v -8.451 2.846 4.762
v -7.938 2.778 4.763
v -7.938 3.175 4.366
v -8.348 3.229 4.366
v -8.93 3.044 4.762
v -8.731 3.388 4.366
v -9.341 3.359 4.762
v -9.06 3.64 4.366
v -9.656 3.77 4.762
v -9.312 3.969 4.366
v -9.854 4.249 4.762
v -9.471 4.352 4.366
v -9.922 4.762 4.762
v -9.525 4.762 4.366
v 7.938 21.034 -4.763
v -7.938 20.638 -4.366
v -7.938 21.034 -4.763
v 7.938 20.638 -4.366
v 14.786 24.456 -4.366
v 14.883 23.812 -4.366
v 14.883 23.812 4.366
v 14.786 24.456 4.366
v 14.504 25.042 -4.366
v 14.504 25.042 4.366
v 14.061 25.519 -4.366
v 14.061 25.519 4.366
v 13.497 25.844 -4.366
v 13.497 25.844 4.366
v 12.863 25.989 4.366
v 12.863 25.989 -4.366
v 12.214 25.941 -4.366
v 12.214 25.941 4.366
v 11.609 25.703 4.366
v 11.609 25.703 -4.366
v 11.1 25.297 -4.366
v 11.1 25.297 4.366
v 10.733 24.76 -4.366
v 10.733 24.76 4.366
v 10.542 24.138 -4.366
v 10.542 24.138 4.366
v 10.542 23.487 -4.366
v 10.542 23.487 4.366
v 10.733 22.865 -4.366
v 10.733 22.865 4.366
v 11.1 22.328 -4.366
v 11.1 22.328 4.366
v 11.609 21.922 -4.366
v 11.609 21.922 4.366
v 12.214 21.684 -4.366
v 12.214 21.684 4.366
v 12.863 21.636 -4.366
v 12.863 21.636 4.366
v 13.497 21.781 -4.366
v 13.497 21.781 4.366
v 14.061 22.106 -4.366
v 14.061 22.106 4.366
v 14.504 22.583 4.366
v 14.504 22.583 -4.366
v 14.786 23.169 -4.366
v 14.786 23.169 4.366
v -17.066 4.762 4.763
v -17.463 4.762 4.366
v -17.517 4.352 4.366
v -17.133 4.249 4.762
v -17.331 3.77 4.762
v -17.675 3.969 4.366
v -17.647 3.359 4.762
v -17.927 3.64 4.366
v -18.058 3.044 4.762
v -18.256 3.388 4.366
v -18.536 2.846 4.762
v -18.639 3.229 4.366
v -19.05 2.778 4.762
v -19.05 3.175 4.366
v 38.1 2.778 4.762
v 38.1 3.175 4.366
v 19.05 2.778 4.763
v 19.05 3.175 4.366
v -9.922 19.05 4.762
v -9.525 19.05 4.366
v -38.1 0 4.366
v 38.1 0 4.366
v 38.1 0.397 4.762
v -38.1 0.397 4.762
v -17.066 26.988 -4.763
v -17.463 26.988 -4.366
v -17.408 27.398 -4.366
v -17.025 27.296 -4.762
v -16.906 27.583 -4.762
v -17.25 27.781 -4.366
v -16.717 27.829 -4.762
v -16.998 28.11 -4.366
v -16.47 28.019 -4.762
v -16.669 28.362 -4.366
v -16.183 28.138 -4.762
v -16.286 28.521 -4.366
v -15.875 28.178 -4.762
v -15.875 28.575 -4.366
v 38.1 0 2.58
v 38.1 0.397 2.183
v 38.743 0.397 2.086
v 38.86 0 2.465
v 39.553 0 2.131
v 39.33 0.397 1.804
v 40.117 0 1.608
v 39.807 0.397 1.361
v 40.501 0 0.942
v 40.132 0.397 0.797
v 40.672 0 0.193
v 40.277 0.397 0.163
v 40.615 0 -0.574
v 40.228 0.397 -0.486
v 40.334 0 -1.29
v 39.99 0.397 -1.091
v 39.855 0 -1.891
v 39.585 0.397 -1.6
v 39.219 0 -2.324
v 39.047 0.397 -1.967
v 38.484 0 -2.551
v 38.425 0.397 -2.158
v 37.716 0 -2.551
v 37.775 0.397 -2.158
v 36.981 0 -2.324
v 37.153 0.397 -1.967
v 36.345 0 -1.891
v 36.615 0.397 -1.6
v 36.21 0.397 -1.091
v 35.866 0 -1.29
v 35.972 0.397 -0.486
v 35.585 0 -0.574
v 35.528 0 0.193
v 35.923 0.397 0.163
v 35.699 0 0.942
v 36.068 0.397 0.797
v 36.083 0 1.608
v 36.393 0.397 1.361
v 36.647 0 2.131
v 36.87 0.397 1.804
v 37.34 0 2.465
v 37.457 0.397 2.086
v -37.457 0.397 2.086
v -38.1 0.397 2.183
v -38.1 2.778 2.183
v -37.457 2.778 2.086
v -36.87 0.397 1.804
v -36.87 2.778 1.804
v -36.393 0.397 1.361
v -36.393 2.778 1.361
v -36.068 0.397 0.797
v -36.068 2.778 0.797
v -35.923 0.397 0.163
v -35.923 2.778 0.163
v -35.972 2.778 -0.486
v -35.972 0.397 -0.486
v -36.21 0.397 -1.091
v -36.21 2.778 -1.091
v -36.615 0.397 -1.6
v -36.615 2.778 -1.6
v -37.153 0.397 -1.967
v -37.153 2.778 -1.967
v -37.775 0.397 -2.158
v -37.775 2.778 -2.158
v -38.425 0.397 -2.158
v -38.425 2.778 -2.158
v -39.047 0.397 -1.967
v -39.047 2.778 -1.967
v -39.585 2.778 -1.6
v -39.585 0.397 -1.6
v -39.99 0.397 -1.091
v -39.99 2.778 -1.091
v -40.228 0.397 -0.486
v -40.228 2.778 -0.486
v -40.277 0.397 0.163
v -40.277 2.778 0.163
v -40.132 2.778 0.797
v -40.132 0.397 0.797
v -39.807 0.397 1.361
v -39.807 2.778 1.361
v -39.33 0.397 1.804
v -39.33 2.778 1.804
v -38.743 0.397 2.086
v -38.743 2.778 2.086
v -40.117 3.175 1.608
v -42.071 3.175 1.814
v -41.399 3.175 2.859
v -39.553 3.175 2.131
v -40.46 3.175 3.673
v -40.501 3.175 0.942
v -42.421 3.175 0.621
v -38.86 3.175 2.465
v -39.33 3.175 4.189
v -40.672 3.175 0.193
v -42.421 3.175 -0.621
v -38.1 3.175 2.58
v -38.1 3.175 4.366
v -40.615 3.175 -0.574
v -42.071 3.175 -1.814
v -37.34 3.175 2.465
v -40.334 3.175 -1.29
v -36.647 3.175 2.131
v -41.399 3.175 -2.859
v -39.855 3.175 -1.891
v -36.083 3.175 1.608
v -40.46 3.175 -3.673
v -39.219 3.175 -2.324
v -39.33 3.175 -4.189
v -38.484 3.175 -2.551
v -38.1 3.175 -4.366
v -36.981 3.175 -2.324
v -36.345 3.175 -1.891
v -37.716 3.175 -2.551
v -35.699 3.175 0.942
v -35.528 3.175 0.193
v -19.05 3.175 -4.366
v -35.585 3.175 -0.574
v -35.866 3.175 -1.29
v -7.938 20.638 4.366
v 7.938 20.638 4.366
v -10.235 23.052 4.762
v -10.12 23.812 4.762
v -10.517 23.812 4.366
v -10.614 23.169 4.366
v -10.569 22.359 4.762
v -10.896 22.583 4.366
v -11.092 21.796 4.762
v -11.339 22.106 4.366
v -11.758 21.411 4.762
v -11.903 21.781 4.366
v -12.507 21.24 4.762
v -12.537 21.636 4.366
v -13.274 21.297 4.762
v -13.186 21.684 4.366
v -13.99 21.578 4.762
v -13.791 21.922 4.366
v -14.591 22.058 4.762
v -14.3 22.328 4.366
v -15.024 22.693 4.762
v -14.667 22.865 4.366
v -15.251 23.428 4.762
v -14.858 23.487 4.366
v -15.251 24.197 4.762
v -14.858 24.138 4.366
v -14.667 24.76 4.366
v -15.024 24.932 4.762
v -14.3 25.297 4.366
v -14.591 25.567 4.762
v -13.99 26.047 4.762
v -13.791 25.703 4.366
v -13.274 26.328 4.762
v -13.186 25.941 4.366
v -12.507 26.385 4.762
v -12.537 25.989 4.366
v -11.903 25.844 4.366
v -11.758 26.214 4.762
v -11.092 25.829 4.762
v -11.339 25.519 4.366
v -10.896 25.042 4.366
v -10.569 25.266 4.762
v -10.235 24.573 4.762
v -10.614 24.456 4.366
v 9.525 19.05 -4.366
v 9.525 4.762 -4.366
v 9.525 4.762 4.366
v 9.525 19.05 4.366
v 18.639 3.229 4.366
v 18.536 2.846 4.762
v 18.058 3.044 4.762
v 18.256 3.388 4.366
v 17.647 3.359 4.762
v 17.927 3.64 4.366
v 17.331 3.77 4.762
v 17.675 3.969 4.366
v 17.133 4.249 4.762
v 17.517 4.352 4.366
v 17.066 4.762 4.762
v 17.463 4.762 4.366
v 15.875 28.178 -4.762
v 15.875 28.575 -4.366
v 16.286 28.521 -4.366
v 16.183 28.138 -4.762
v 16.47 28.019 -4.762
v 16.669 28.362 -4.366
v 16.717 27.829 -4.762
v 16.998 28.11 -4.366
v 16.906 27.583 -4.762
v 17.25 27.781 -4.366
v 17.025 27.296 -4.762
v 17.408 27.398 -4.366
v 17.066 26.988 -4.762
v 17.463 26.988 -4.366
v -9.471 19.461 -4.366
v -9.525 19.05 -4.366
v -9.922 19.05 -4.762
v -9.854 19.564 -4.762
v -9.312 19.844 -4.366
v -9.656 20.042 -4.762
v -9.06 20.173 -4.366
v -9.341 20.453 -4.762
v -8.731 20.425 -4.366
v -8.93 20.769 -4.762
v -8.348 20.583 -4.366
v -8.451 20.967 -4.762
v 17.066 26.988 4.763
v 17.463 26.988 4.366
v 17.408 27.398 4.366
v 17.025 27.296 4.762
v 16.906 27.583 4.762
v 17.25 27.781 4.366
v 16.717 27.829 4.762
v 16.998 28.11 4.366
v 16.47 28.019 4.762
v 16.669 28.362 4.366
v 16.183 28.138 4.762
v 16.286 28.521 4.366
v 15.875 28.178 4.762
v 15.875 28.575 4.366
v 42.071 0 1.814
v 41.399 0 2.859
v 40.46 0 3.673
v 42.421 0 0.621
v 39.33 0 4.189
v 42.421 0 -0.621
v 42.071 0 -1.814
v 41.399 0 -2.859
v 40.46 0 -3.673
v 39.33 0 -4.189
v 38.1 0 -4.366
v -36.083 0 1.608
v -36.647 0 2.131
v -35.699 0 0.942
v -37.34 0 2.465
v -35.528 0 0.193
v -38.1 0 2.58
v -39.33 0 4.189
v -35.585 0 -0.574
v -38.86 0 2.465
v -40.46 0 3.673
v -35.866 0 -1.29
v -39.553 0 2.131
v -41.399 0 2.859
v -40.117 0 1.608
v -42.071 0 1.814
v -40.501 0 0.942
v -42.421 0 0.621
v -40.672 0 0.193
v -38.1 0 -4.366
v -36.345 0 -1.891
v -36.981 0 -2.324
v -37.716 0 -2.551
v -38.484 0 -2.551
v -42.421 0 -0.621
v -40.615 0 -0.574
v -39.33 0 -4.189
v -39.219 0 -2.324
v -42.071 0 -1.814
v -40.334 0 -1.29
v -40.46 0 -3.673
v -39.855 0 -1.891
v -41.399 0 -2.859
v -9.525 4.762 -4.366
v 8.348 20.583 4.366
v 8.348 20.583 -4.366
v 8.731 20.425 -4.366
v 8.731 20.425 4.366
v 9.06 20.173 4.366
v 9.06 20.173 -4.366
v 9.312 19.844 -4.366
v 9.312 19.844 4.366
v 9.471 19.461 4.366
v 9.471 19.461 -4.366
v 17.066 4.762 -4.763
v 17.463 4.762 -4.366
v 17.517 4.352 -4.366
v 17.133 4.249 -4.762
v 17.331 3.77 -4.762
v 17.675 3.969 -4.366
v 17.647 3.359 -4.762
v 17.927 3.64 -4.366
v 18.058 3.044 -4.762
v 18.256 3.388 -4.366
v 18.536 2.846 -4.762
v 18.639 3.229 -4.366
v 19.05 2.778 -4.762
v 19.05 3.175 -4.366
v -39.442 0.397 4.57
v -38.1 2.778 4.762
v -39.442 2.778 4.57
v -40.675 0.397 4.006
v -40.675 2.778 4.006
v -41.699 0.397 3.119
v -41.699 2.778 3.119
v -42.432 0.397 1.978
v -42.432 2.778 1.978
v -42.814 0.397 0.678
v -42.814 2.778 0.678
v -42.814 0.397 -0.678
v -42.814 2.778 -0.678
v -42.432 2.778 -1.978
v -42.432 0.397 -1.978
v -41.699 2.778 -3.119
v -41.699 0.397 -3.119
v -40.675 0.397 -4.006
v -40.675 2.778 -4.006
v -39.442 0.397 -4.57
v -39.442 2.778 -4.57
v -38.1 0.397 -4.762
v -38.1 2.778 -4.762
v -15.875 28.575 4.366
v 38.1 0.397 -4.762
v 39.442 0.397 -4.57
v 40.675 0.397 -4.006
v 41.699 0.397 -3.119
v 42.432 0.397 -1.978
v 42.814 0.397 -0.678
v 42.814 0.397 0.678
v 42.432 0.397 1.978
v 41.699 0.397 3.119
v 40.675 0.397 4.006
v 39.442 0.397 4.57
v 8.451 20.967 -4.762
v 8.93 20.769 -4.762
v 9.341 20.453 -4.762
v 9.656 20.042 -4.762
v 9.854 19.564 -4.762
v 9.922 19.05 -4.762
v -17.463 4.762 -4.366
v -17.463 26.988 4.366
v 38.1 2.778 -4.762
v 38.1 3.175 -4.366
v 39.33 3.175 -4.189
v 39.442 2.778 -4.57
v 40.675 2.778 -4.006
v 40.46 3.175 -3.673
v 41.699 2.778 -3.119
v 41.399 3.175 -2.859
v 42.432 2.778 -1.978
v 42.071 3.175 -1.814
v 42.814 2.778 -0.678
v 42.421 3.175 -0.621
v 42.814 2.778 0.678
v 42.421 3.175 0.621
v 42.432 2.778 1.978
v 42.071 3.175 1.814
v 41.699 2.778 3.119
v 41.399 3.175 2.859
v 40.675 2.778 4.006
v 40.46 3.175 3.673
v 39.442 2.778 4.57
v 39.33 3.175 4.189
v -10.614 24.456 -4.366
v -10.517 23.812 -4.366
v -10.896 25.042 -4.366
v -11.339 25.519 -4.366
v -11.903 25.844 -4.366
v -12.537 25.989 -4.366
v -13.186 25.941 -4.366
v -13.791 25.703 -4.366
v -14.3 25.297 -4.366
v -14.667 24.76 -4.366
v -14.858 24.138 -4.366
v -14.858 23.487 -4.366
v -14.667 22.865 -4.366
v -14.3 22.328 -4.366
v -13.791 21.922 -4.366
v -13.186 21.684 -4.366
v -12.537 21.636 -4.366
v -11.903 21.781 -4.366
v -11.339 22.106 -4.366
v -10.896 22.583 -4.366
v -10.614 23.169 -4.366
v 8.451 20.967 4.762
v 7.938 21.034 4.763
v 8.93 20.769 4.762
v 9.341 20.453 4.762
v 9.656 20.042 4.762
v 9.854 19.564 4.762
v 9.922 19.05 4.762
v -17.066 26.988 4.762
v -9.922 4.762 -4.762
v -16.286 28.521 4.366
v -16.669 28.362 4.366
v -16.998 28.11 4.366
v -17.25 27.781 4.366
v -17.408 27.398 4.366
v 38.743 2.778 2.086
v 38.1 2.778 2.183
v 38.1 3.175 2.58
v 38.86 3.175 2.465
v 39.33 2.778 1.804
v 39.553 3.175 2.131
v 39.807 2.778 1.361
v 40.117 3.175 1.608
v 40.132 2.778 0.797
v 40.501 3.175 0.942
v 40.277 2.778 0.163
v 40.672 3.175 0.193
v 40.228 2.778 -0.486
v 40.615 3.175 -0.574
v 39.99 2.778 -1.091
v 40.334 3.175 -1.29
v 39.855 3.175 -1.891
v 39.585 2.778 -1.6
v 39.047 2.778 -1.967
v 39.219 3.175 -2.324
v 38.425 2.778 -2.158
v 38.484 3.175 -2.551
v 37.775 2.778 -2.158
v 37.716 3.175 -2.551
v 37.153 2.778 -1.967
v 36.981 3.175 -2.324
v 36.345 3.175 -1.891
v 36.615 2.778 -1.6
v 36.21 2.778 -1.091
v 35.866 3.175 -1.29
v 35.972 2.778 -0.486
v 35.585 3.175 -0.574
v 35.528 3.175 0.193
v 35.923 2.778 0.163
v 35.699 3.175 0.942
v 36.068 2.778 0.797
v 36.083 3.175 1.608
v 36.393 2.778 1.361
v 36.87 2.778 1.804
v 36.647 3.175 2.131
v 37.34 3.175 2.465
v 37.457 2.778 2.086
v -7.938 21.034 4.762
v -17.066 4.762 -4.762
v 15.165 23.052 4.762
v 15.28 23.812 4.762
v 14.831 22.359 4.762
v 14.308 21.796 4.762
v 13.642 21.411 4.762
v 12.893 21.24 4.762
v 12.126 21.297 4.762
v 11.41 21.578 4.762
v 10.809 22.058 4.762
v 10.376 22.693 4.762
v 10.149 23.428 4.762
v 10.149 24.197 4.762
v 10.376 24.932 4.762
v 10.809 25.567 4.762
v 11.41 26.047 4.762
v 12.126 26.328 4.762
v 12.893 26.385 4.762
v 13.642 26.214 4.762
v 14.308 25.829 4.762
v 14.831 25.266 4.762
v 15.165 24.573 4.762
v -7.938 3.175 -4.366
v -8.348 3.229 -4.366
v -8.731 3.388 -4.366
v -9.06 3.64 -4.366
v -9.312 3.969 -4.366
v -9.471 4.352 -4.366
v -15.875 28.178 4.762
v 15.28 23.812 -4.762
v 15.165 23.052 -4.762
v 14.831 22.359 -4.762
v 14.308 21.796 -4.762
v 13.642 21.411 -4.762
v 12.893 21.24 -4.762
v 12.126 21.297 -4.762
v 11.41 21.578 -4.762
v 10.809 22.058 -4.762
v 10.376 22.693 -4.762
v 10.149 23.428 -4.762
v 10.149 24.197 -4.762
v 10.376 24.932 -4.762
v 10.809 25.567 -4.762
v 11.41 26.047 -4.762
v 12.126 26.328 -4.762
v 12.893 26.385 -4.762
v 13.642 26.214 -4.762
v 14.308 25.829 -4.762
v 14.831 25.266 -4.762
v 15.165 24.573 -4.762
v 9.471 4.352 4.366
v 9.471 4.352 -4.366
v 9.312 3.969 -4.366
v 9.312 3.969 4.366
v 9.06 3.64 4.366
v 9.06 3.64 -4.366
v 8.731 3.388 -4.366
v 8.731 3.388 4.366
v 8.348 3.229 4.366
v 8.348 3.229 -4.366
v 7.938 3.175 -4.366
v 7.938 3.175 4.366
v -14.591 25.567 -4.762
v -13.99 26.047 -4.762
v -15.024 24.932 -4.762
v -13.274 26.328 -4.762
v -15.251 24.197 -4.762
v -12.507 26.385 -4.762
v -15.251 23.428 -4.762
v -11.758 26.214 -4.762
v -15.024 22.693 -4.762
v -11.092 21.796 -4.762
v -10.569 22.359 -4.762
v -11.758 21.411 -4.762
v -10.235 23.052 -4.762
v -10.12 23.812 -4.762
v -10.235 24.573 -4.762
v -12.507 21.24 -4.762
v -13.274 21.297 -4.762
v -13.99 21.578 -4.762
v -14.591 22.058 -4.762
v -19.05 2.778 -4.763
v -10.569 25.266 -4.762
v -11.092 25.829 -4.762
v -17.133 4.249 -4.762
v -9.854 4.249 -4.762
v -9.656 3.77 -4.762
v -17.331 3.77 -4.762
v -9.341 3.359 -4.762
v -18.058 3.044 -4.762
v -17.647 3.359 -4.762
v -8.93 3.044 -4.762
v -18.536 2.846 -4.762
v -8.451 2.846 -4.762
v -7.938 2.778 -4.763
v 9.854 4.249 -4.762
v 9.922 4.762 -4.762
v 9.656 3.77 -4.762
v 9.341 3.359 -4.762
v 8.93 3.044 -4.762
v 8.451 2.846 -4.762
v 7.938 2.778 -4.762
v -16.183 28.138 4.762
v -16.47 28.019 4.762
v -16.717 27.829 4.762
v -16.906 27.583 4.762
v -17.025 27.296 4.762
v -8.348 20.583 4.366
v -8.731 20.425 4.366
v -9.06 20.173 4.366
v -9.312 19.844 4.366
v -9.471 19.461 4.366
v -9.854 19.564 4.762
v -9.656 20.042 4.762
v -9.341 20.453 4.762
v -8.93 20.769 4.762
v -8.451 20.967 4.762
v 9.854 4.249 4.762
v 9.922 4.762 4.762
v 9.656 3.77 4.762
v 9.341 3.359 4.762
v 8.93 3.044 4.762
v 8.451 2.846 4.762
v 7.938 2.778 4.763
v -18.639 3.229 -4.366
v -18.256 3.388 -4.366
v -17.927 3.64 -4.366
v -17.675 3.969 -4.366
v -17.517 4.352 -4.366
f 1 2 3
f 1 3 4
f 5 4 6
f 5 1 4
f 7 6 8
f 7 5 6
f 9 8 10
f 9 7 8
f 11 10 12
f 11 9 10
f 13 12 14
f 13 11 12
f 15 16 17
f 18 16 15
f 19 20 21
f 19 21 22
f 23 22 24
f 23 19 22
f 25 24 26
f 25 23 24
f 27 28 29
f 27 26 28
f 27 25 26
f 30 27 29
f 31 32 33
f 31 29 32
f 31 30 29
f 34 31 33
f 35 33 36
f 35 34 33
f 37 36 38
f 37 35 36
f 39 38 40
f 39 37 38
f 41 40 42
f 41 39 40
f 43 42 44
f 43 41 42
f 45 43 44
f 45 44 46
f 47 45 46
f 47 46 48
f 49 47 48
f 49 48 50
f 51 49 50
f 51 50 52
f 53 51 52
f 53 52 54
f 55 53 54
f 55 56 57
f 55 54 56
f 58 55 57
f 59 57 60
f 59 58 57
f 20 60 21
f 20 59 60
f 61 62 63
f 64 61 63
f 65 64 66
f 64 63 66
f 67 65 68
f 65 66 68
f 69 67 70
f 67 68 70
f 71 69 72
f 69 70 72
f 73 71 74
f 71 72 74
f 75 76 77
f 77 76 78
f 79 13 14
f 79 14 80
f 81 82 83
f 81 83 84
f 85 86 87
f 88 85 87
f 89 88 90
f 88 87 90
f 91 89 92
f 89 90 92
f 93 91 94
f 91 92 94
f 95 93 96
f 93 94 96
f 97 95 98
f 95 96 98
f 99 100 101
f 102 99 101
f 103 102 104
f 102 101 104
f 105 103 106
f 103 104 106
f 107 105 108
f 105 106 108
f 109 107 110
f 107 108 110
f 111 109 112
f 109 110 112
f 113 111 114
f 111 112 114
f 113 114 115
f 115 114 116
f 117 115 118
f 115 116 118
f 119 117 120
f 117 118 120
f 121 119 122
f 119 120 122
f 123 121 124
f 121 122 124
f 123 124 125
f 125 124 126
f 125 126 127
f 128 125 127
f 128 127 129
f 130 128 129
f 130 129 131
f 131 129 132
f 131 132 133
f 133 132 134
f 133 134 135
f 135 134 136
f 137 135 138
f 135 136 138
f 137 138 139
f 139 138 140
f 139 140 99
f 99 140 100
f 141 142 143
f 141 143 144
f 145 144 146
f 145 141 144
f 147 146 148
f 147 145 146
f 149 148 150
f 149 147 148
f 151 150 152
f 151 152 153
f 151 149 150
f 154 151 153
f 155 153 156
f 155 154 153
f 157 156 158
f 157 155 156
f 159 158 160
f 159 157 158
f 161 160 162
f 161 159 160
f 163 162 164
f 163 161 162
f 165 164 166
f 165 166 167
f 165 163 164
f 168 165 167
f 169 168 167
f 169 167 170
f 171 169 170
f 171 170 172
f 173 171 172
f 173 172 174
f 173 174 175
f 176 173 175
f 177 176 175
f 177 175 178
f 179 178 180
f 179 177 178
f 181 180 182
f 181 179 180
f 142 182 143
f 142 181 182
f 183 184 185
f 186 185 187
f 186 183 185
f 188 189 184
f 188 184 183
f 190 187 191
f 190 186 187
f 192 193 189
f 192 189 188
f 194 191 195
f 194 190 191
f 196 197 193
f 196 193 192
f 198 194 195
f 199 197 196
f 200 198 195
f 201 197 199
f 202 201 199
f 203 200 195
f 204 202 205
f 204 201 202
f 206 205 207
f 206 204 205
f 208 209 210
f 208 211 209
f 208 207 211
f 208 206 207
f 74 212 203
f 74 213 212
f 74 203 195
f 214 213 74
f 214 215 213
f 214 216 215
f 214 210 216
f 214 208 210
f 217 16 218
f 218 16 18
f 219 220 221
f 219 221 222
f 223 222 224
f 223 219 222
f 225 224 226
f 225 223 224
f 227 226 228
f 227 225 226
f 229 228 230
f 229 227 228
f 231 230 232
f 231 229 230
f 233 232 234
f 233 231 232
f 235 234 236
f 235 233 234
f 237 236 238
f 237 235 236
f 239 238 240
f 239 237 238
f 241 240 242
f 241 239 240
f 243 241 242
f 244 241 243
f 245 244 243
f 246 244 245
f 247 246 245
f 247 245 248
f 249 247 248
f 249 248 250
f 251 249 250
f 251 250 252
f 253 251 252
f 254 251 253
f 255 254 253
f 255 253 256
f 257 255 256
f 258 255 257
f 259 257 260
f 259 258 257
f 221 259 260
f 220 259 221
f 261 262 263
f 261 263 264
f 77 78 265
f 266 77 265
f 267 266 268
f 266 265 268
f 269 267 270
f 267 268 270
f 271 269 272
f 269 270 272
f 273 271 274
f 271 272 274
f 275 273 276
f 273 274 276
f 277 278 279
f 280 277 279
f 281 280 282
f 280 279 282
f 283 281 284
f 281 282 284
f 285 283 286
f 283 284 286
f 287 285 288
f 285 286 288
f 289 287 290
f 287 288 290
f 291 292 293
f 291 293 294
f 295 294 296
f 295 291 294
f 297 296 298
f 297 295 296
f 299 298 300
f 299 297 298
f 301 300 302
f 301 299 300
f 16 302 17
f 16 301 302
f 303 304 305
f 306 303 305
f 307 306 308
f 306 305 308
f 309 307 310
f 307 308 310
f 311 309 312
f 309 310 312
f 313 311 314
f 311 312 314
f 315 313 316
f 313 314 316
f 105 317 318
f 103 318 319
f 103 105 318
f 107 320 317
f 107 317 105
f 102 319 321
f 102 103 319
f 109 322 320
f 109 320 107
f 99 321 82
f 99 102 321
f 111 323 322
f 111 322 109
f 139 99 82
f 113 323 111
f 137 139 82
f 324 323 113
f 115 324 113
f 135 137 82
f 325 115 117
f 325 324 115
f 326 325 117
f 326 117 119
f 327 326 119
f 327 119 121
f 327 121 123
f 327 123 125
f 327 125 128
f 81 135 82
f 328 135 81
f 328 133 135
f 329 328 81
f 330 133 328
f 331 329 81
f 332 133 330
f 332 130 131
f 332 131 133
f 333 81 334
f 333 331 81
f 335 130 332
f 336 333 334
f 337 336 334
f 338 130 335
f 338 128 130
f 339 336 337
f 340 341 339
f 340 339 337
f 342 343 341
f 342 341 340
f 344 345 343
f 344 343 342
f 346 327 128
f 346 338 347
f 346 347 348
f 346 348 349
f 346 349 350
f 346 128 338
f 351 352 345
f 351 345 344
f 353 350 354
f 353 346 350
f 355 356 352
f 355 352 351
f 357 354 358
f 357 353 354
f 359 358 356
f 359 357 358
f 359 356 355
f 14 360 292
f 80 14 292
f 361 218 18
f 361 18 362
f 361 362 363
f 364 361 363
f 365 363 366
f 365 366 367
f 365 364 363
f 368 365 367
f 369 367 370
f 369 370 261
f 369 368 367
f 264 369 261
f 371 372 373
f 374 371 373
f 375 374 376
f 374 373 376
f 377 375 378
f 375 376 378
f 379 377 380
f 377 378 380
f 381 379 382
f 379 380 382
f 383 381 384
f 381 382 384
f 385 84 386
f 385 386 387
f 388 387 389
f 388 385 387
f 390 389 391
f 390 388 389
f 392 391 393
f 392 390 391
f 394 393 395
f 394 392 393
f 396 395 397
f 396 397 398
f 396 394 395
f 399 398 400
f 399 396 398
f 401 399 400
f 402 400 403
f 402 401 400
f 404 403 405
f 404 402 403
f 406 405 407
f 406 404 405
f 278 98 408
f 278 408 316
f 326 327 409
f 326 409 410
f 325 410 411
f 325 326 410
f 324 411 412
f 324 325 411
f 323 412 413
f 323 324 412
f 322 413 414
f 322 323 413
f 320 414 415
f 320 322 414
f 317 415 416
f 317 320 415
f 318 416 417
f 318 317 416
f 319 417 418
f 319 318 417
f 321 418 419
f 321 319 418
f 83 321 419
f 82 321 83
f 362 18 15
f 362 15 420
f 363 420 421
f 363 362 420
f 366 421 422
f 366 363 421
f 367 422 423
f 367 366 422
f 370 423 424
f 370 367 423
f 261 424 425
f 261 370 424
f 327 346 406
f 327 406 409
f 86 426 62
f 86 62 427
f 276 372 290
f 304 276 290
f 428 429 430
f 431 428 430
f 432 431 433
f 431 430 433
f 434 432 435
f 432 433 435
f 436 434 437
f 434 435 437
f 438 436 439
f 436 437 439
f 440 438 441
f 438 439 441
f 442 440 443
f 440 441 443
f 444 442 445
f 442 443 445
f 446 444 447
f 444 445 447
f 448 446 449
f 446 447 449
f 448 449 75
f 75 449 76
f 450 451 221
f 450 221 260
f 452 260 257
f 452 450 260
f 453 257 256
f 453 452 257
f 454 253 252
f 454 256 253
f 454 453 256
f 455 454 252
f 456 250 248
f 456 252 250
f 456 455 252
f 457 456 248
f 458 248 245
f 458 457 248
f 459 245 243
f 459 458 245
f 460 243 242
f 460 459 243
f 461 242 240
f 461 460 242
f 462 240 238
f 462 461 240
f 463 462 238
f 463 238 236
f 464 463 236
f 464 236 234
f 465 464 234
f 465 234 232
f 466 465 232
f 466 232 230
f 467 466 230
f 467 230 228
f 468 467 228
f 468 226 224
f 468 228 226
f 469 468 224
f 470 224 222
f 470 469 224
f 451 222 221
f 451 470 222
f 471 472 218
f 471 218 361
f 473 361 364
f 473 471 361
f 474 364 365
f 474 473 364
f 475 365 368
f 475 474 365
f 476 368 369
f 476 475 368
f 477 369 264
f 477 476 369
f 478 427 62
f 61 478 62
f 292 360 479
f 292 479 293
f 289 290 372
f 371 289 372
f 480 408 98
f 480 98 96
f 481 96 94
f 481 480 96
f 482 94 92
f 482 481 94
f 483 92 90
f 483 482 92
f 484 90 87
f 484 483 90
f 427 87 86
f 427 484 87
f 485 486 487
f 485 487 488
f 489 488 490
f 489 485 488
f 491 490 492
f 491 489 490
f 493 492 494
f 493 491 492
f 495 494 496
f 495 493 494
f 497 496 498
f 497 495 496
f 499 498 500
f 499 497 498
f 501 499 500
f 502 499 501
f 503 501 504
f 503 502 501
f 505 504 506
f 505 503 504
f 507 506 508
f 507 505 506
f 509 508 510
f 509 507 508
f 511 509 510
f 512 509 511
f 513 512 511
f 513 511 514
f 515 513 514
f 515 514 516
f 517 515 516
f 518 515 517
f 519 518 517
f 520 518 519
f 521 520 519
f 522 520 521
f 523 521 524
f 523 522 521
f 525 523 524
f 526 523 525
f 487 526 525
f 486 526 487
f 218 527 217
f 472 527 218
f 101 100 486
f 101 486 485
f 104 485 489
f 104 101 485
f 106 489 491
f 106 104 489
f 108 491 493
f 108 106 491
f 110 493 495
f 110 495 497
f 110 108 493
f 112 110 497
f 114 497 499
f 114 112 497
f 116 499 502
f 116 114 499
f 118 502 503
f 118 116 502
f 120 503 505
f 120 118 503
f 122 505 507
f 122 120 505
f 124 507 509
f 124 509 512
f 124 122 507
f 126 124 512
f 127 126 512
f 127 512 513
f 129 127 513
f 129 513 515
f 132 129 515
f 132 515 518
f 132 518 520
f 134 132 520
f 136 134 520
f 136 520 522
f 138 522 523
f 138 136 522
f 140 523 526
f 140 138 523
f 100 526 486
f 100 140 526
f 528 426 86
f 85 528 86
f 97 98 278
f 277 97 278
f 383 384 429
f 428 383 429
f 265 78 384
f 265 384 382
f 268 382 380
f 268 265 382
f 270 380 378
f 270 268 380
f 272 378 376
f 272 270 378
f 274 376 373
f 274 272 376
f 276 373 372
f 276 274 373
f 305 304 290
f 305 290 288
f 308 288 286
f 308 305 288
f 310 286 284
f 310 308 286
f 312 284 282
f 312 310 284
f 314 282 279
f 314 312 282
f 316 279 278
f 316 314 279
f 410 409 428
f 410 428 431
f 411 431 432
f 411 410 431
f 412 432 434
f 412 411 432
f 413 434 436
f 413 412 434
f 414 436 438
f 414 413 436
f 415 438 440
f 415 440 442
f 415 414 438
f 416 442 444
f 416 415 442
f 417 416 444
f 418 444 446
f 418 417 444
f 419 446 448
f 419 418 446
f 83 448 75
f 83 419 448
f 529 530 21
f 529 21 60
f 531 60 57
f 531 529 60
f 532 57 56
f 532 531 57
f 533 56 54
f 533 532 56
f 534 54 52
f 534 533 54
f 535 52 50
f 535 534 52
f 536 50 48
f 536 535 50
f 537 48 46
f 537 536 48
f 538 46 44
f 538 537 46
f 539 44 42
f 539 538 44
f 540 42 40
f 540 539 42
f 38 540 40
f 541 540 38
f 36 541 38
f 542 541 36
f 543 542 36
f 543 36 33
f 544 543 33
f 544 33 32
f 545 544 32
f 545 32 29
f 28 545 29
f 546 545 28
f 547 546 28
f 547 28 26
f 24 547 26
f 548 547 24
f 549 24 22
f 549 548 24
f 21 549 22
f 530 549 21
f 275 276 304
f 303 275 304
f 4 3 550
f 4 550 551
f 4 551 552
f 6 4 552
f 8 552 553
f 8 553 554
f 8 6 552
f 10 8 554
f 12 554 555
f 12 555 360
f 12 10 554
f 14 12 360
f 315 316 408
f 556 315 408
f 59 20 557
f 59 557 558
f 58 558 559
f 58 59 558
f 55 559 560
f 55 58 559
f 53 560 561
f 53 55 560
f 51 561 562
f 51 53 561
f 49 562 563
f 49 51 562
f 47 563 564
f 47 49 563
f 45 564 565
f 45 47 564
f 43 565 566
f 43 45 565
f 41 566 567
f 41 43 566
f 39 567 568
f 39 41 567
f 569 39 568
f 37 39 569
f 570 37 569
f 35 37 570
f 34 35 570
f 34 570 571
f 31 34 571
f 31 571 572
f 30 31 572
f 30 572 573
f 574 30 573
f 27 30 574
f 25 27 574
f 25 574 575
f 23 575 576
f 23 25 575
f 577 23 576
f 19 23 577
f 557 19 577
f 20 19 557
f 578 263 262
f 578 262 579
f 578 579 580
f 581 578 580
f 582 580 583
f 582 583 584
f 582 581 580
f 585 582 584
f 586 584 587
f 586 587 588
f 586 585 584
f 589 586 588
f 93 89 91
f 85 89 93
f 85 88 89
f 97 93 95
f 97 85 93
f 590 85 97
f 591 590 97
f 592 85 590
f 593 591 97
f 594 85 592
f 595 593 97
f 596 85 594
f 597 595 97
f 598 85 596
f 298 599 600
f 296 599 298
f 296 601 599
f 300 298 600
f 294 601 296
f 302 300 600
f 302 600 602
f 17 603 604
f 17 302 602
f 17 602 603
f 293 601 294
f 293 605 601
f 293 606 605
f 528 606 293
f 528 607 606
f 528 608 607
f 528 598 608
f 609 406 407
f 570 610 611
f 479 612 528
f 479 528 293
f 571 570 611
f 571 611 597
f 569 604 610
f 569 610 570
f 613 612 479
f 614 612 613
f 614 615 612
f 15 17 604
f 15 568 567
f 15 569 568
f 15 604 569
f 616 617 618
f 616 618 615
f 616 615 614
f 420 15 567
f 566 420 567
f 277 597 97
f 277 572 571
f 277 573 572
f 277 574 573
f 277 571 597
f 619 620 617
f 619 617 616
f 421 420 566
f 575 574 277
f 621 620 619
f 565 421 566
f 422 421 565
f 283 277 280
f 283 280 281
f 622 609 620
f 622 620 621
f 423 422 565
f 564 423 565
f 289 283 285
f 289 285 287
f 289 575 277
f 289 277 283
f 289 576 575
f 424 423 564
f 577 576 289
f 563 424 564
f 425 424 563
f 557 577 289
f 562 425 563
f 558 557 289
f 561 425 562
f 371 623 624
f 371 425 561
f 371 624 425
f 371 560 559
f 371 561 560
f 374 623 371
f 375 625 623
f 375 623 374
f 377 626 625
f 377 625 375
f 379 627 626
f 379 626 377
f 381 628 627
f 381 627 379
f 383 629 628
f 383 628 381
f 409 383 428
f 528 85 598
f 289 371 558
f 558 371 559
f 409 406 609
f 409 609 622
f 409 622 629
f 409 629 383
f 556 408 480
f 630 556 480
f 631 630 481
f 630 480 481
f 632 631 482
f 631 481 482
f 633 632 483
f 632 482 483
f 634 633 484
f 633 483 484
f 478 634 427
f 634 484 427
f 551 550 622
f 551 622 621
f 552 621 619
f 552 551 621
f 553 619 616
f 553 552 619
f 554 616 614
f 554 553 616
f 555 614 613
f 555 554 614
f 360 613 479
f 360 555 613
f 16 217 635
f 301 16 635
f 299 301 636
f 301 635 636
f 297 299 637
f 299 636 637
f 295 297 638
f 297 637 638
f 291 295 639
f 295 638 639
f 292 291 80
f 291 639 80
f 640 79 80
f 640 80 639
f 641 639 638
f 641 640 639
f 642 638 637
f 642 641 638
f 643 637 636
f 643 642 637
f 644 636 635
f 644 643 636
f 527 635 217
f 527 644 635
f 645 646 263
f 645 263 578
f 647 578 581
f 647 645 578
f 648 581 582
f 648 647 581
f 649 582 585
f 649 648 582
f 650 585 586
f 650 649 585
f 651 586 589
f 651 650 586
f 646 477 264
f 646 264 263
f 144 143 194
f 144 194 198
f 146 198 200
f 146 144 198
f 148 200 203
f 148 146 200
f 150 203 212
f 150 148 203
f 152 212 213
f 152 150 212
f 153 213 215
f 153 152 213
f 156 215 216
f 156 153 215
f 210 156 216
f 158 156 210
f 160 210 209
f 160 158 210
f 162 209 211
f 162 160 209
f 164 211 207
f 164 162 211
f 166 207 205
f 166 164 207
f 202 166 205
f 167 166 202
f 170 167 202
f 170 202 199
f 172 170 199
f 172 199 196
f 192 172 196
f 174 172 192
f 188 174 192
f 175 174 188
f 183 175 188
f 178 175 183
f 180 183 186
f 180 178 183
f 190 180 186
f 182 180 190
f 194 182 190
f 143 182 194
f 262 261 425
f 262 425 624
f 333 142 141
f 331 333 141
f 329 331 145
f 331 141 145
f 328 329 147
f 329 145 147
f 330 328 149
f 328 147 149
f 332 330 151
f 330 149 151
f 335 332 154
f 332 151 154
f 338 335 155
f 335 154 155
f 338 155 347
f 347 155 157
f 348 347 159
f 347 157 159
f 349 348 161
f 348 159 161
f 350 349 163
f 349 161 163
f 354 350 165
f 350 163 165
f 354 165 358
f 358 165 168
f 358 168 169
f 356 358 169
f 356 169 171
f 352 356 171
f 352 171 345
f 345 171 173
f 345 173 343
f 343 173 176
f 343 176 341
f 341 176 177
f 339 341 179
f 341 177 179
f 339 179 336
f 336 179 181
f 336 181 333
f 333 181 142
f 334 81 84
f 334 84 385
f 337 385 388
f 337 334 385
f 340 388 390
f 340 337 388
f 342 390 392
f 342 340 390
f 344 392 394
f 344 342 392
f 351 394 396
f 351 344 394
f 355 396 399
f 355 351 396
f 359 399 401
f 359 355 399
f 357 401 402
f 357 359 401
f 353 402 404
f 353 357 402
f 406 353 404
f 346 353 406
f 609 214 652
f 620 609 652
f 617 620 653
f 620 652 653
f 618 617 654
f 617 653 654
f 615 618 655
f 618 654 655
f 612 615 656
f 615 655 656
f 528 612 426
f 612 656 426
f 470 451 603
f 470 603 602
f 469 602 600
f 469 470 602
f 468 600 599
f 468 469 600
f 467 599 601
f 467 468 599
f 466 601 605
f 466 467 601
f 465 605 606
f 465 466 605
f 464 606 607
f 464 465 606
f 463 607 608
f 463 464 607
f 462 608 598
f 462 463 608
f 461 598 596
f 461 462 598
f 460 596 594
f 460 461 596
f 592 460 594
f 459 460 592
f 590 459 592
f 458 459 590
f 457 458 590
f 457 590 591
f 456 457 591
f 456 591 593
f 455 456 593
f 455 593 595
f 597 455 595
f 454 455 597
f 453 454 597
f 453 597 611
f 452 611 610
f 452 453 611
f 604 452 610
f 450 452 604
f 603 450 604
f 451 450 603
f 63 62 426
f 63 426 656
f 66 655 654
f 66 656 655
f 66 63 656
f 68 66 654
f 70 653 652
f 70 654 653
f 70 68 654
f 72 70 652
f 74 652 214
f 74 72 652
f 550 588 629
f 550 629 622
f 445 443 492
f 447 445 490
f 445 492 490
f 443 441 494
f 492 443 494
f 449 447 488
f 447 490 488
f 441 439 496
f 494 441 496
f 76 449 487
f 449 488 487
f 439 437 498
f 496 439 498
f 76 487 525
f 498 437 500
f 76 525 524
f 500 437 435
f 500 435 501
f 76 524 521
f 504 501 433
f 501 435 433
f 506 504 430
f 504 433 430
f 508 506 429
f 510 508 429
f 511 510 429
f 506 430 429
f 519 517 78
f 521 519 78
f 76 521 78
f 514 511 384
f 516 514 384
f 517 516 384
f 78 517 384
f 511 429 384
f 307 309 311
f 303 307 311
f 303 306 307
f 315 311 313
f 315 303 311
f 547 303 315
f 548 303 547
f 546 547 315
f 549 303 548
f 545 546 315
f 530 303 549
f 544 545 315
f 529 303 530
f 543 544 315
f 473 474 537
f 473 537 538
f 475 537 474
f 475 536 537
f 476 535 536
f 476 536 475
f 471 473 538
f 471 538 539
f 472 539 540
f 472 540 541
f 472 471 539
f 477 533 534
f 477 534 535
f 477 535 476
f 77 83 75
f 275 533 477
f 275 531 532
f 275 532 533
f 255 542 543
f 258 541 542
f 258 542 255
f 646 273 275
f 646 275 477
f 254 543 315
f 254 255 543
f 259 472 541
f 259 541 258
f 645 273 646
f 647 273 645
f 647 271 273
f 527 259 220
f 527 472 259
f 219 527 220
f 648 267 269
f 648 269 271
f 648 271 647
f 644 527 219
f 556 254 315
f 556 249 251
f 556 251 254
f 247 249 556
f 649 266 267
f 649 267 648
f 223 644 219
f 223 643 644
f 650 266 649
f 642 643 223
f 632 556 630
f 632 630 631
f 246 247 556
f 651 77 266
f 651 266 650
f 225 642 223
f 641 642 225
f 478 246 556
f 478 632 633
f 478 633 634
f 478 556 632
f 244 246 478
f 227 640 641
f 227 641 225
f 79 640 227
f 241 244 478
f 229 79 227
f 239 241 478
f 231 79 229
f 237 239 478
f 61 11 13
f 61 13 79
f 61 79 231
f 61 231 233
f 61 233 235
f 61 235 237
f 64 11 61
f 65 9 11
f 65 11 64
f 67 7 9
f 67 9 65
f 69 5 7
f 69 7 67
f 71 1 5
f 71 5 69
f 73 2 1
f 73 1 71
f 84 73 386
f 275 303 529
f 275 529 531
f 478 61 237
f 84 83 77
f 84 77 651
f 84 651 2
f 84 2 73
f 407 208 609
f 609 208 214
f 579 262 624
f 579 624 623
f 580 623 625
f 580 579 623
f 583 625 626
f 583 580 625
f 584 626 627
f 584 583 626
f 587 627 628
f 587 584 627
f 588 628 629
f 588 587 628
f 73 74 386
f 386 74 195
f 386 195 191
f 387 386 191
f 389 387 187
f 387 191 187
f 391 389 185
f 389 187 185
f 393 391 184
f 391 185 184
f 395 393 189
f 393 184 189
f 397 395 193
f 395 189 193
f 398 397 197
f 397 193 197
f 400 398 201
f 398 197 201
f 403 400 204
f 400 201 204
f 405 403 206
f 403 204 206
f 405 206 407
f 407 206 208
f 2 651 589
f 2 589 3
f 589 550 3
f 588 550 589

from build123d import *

# Parameters (mm, degrees)
SKETCH2_R               = 2.1828125
BOSS_EXTRUDE1_DEPTH     = 3.175
SKETCH3_W               = 36.843225838
SKETCH3_H               = 9.525
BOSS_EXTRUDE2_DEPTH     = 25.4
CUT_EXTRUDE1_DEPTH      = 53.3875
CUT_EXTRUDE1_DEPTH_BACK = 53.3875
SKETCH4_R               = 2.1828125
SKETCH4_W               = 0.959112919
SKETCH4_H               = 25.4
SKETCH4_W_2             = 19.05
SKETCH4_H_2             = 17.4625
FILLET1_R               = 1.5875
CHAMFER1_SIZE           = 0.396875


with BuildPart() as part:
    # Sketch2 → Boss-Extrude1 (new body)
    with BuildSketch(Plane(origin=(0, 0, 0), x_dir=(1, 0, 0), z_dir=(0, 1, 0))):
        with BuildLine():
            Line((-38.1, 4.7625), (38.1, 4.7625))
            ThreePointArc((38.1, 4.7625), (42.8625, 0), (38.1, -4.7625))
            Line((38.1, -4.7625), (-38.1, -4.7625))
            ThreePointArc((-38.1, -4.7625), (-42.8625, 0), (-38.1, 4.7625))
        make_face()
        with Locations(Location((-38.1, 0, 0), (0, 0, 270))):
            Circle(SKETCH2_R, mode=Mode.SUBTRACT)
        with Locations(Location((38.1, 0, 0), (0, 0, 270))):
            Circle(SKETCH2_R, mode=Mode.SUBTRACT)
    extrude(amount=BOSS_EXTRUDE1_DEPTH)

    # Sketch3 → Boss-Extrude2 (add)
    with BuildSketch(Plane(origin=(0, 3.175, 0), x_dir=(1, 0, 0), z_dir=(0, 1, 0))):
        Rectangle(SKETCH3_W, SKETCH3_H)
    extrude(amount=BOSS_EXTRUDE2_DEPTH)

    # Sketch4 → Cut-Extrude1 (cut, two sides: drawn at the far end of the back side and taken through both)
    with BuildSketch(Plane.XY.offset(4.7625).offset(-CUT_EXTRUDE1_DEPTH_BACK)):
        with Locations((-12.7, 23.8125)):
            Circle(SKETCH4_R)
        with Locations((12.7, 23.8125)):
            Circle(SKETCH4_R)
        with Locations((-17.94205646, 15.875)):
            Rectangle(SKETCH4_W, SKETCH4_H)
        with Locations((17.94205646, 15.875)):
            Rectangle(SKETCH4_W, SKETCH4_H)
        with Locations((0, 11.90625)):
            Rectangle(SKETCH4_W_2, SKETCH4_H_2)
    extrude(amount=CUT_EXTRUDE1_DEPTH + CUT_EXTRUDE1_DEPTH_BACK, mode=Mode.SUBTRACT)

    # Fillet1
    fillet1_edges = [part.edges().sort_by_distance(p)[0] for p in [
        (-17.4625, 3.175, 0),
        (-17.4625, 28.575, 0),
        (17.4625, 28.575, 0),
        (17.4625, 3.175, 0),
        (-9.525, 3.175, 0),
        (-9.525, 20.6375, 0),
        (9.525, 20.6375, 0),
        (9.525, 3.175, 0),
    ]]
    fillet(fillet1_edges, radius=FILLET1_R)

    # Chamfer1
    chamfer1_edges = [part.edges().sort_by_distance(p)[0] for p in [
        (0, 28.575, -4.7625),
        (0, 28.575, 4.7625),
        (0, 3.175, 4.7625),
        (-9.525, 11.90625, 4.7625),
        (0, 20.6375, 4.7625),
        (9.525, 11.90625, 4.7625),
        (-17.4625, 15.875, 4.7625),
        (28.575, 3.175, 4.7625),
        (17.4625, 15.875, 4.7625),
        (16.997532015, 28.110032015, 4.7625),
        (-16.997532015, 28.110032015, 4.7625),
        (-17.4625, 15.875, -4.7625),
        (0, 20.6375, -4.7625),
        (-9.525, 11.90625, -4.7625),
        (0, 3.175, -4.7625),
        (9.525, 11.90625, -4.7625),
        (-28.575, 3.175, -4.7625),
        (17.4625, 15.875, -4.7625),
        (16.997532015, 28.110032015, -4.7625),
        (-16.997532015, 28.110032015, -4.7625),
        (-38.1, 0, -2.1828125),
        (-17.927467985, 3.639967985, 4.7625),
        (-38.1, 3.175, -2.1828125),
        (-17.927467985, 3.639967985, -4.7625),
        (17.927467985, 3.639967985, 4.7625),
        (17.927467985, 3.639967985, -4.7625),
        (-9.060032015, 20.172532015, 4.7625),
        (42.8625, 3.175, 0),
        (-9.060032015, 20.172532015, -4.7625),
        (9.060032015, 20.172532015, 4.7625),
        (9.060032015, 20.172532015, -4.7625),
        (9.060032015, 3.639967985, 4.7625),
        (9.060032015, 3.639967985, -4.7625),
        (-9.060032015, 3.639967985, 4.7625),
        (-9.060032015, 3.639967985, -4.7625),
        (38.1, 0, -2.1828125),
        (38.1, 3.175, -2.1828125),
        (28.575, 3.175, -4.7625),
        (10.5171875, 23.8125, -4.7625),
        (10.5171875, 23.8125, 4.7625),
        (-42.8625, 3.175, 0),
        (0, 0, -4.7625),
        (42.8625, 0, 0),
        (0, 0, 4.7625),
        (-42.8625, 0, 0),
        (-14.8828125, 23.8125, -4.7625),
        (-14.8828125, 23.8125, 4.7625),
        (-28.575, 3.175, 4.7625),
    ]]
    chamfer(chamfer1_edges, length=CHAMFER1_SIZE)


solid = part.part
